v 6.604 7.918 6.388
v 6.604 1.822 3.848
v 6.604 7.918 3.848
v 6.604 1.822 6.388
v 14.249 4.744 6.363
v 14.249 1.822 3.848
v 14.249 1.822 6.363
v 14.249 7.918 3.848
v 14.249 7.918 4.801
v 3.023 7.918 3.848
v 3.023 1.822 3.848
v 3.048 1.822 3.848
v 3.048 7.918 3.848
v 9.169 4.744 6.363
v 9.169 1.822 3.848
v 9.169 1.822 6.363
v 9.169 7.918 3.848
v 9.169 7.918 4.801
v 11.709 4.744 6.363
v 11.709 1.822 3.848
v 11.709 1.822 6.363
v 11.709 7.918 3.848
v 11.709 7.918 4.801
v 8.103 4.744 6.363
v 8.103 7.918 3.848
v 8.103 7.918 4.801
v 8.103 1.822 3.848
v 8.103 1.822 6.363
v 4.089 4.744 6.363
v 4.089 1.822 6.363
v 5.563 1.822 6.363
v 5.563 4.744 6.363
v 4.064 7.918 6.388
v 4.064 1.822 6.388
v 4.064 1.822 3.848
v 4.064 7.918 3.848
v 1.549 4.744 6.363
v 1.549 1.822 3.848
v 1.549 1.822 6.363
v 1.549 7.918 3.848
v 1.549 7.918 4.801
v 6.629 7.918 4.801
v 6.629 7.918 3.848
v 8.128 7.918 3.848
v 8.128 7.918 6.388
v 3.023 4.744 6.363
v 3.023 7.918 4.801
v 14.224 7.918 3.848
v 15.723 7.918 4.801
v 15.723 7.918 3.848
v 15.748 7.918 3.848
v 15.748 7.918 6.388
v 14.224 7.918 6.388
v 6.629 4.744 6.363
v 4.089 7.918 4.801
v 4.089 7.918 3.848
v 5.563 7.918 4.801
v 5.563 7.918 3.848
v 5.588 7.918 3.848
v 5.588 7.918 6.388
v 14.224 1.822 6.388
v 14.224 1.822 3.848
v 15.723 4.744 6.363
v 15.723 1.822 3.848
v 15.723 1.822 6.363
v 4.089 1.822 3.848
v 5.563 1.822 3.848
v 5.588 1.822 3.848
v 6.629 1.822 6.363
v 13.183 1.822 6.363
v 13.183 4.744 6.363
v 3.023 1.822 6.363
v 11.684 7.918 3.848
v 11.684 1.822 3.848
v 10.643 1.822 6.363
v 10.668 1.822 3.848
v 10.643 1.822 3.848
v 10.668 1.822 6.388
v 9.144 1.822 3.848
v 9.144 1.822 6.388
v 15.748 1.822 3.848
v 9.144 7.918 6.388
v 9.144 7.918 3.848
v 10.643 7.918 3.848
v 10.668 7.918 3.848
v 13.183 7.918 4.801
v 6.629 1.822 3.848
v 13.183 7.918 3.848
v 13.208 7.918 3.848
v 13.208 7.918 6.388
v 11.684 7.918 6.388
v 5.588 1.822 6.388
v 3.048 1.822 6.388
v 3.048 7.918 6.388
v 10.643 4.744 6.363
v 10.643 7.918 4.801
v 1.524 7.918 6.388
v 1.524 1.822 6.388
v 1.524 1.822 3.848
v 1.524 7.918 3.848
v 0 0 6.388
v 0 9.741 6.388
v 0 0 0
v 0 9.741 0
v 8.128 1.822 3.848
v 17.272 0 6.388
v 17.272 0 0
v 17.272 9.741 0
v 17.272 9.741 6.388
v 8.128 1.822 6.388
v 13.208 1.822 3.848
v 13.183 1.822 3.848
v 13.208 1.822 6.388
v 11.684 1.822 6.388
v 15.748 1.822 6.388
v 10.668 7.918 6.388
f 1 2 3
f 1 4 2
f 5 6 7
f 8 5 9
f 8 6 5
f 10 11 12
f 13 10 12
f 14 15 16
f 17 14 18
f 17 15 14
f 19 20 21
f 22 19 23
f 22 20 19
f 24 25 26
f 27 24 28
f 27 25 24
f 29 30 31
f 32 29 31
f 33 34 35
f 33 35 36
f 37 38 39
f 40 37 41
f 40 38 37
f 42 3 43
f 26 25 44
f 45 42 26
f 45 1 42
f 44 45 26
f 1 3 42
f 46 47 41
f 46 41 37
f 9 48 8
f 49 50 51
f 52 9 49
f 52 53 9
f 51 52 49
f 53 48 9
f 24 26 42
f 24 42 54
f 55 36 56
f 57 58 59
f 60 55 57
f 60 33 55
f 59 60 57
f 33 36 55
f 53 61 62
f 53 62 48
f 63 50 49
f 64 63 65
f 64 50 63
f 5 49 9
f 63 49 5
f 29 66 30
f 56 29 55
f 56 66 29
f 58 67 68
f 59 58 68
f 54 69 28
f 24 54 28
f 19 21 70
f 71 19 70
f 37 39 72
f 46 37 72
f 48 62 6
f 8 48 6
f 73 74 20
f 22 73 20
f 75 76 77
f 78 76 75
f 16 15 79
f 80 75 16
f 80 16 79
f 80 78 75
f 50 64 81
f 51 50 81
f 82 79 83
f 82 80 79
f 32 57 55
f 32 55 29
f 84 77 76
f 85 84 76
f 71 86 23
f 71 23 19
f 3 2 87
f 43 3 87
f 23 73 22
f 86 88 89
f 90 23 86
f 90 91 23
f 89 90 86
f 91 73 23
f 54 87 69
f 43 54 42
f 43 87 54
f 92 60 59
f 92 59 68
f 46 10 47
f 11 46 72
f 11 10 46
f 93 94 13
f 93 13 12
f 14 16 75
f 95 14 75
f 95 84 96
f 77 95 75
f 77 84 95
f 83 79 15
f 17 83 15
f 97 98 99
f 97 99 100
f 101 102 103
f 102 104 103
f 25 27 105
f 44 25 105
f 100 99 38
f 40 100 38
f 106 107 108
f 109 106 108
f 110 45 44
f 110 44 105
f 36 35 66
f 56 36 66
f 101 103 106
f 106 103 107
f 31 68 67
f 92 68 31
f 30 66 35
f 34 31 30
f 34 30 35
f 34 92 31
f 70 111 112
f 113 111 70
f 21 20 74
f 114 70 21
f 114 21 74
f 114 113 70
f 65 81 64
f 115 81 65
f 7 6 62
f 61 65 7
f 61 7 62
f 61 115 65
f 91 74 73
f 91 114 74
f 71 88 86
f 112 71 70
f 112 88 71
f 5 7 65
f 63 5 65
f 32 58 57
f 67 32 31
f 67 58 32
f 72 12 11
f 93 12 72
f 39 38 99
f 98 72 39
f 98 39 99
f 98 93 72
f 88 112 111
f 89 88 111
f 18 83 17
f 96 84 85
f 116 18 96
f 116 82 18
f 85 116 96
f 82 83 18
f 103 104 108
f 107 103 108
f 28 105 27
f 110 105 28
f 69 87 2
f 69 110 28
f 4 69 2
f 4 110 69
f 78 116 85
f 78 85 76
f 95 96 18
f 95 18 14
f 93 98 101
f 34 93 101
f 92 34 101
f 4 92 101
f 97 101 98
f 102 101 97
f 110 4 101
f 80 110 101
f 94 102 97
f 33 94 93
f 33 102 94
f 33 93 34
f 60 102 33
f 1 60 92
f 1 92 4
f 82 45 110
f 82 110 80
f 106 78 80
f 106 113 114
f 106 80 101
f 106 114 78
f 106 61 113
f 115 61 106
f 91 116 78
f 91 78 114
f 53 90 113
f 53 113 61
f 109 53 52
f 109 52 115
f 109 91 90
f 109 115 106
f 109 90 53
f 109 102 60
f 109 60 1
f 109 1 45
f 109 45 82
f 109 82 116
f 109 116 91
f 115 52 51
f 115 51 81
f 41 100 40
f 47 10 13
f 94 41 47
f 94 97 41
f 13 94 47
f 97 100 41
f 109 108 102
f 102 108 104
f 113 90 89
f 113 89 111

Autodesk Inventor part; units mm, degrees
ref_plane "YZ Plane" through (0, 0, 0) normal (1, 0, 0) x (0, 1, 0)
ref_plane "XZ Plane" through (0, 0, 0) normal (0, 1, 0) x (-1, 0, 0)
ref_plane "XY Plane" through (0, 0, 0) normal (0, 0, 1) x (1, 0, 0)
sketch "Sketch1" plane through (0, 0, 0) normal (0, 0, 1) x (1, 0, 0)
  line L0 (0, 0) -> (17.272, 0)
  line L1 (17.272, 0) -> (17.272, 9.7409)
  line L2 (17.272, 9.7409) -> (0, 9.7409)
  line L3 (0, 9.7409) -> (0, 0)
  dimension "d0" = 9.7409
  dimension "d1" = 17.272
extrude "Extrusion1" add sketch "Sketch1" along normal blind 6.3881
sketch "Sketch2" plane through (0, 0, 6.3881) normal (0, 0, 1) x (1, 0, 0)
  line L0 (0, 0) -> (0, 9.7409)
  line L1 (17.272, 0) -> (0, 0)
  line L2 (0, 9.7409) -> (17.272, 9.7409)
  line L3 (1.524, 7.9185) -> (3.048, 7.9185)
  line L4 (3.048, 7.9185) -> (3.048, 1.8225)
  line L5 (3.048, 1.8225) -> (1.524, 1.8224)
  line L6 (1.524, 1.8224) -> (1.524, 7.9185)
  line L7 (3.048, 7.9185) -> (3.048, 9.7409)
  line L8 (1.524, 1.8224) -> (1.524, 0)
  dimension "d4" = 1.524
  dimension "d5" = 6.096
  dimension "d7" = 1.524
extrude "Extrusion2" cut sketch "Sketch2" against normal blind 2.54 contours L6 L3 L4 L5
sketch "Sketch6" plane through (0, 0, 3.8481) normal (0, 0, 1) x (1, 0, 0)
  line L0 (1.524, 1.8224) -> (3.048, 1.8225)
  line L1 (3.048, 1.8225) -> (3.048, 7.9185)
  line L2 (3.048, 7.9185) -> (1.524, 7.9185)
  line L3 (1.524, 7.9185) -> (1.524, 1.8224)
  line L4 (1.5494, 7.9185) -> (3.0226, 7.9184)
  line L5 (3.0226, 7.9184) -> (3.0226, 1.8225)
  line L6 (3.0226, 1.8225) -> (1.5494, 1.8224)
  line L7 (1.5494, 1.8224) -> (1.5494, 7.9185)
  line L8 (1.5494, 4.8704) -> (1.524, 4.8705) construction
  line L9 (3.0226, 4.8704) -> (3.048, 4.8704) construction
  dimension "d38" = 0.0254
extrude "Extrusion6" add sketch "Sketch6" along normal blind 2.5146 contours L7 L2 L5 L0
sketch "Sketch7" plane through (3.0226, 1.8225, 3.8481) normal (1, 0, 0) x (0, 0, -1)
  line L0 (-2.5146, 6.096) -> (-2.5146, 0) projected
  line L1 (-2.5146, 6.096) -> (0, 6.096) projected
  line L2 (-0.9525, 6.096) -> (-2.5146, 2.921)
  point P0 (-2.54, 6.096)
  dimension "d41" = 3.175
  dimension "d42" = 1.5875
extrude "Extrusion7" cut sketch "Sketch7" against normal up to surface (1.4986 mm away)
pattern_linear "Rectangular Pattern5" count 6 spacing 2.54 along (1, 0, 0) of "Extrusion2"
pattern_linear "Rectangular Pattern6" count 6 spacing 2.54 along (1, 0, 0) of "Extrusion6", "Extrusion7"
properties part number "cRIO-FRC DIP Switch" material "ABS Plastic"
